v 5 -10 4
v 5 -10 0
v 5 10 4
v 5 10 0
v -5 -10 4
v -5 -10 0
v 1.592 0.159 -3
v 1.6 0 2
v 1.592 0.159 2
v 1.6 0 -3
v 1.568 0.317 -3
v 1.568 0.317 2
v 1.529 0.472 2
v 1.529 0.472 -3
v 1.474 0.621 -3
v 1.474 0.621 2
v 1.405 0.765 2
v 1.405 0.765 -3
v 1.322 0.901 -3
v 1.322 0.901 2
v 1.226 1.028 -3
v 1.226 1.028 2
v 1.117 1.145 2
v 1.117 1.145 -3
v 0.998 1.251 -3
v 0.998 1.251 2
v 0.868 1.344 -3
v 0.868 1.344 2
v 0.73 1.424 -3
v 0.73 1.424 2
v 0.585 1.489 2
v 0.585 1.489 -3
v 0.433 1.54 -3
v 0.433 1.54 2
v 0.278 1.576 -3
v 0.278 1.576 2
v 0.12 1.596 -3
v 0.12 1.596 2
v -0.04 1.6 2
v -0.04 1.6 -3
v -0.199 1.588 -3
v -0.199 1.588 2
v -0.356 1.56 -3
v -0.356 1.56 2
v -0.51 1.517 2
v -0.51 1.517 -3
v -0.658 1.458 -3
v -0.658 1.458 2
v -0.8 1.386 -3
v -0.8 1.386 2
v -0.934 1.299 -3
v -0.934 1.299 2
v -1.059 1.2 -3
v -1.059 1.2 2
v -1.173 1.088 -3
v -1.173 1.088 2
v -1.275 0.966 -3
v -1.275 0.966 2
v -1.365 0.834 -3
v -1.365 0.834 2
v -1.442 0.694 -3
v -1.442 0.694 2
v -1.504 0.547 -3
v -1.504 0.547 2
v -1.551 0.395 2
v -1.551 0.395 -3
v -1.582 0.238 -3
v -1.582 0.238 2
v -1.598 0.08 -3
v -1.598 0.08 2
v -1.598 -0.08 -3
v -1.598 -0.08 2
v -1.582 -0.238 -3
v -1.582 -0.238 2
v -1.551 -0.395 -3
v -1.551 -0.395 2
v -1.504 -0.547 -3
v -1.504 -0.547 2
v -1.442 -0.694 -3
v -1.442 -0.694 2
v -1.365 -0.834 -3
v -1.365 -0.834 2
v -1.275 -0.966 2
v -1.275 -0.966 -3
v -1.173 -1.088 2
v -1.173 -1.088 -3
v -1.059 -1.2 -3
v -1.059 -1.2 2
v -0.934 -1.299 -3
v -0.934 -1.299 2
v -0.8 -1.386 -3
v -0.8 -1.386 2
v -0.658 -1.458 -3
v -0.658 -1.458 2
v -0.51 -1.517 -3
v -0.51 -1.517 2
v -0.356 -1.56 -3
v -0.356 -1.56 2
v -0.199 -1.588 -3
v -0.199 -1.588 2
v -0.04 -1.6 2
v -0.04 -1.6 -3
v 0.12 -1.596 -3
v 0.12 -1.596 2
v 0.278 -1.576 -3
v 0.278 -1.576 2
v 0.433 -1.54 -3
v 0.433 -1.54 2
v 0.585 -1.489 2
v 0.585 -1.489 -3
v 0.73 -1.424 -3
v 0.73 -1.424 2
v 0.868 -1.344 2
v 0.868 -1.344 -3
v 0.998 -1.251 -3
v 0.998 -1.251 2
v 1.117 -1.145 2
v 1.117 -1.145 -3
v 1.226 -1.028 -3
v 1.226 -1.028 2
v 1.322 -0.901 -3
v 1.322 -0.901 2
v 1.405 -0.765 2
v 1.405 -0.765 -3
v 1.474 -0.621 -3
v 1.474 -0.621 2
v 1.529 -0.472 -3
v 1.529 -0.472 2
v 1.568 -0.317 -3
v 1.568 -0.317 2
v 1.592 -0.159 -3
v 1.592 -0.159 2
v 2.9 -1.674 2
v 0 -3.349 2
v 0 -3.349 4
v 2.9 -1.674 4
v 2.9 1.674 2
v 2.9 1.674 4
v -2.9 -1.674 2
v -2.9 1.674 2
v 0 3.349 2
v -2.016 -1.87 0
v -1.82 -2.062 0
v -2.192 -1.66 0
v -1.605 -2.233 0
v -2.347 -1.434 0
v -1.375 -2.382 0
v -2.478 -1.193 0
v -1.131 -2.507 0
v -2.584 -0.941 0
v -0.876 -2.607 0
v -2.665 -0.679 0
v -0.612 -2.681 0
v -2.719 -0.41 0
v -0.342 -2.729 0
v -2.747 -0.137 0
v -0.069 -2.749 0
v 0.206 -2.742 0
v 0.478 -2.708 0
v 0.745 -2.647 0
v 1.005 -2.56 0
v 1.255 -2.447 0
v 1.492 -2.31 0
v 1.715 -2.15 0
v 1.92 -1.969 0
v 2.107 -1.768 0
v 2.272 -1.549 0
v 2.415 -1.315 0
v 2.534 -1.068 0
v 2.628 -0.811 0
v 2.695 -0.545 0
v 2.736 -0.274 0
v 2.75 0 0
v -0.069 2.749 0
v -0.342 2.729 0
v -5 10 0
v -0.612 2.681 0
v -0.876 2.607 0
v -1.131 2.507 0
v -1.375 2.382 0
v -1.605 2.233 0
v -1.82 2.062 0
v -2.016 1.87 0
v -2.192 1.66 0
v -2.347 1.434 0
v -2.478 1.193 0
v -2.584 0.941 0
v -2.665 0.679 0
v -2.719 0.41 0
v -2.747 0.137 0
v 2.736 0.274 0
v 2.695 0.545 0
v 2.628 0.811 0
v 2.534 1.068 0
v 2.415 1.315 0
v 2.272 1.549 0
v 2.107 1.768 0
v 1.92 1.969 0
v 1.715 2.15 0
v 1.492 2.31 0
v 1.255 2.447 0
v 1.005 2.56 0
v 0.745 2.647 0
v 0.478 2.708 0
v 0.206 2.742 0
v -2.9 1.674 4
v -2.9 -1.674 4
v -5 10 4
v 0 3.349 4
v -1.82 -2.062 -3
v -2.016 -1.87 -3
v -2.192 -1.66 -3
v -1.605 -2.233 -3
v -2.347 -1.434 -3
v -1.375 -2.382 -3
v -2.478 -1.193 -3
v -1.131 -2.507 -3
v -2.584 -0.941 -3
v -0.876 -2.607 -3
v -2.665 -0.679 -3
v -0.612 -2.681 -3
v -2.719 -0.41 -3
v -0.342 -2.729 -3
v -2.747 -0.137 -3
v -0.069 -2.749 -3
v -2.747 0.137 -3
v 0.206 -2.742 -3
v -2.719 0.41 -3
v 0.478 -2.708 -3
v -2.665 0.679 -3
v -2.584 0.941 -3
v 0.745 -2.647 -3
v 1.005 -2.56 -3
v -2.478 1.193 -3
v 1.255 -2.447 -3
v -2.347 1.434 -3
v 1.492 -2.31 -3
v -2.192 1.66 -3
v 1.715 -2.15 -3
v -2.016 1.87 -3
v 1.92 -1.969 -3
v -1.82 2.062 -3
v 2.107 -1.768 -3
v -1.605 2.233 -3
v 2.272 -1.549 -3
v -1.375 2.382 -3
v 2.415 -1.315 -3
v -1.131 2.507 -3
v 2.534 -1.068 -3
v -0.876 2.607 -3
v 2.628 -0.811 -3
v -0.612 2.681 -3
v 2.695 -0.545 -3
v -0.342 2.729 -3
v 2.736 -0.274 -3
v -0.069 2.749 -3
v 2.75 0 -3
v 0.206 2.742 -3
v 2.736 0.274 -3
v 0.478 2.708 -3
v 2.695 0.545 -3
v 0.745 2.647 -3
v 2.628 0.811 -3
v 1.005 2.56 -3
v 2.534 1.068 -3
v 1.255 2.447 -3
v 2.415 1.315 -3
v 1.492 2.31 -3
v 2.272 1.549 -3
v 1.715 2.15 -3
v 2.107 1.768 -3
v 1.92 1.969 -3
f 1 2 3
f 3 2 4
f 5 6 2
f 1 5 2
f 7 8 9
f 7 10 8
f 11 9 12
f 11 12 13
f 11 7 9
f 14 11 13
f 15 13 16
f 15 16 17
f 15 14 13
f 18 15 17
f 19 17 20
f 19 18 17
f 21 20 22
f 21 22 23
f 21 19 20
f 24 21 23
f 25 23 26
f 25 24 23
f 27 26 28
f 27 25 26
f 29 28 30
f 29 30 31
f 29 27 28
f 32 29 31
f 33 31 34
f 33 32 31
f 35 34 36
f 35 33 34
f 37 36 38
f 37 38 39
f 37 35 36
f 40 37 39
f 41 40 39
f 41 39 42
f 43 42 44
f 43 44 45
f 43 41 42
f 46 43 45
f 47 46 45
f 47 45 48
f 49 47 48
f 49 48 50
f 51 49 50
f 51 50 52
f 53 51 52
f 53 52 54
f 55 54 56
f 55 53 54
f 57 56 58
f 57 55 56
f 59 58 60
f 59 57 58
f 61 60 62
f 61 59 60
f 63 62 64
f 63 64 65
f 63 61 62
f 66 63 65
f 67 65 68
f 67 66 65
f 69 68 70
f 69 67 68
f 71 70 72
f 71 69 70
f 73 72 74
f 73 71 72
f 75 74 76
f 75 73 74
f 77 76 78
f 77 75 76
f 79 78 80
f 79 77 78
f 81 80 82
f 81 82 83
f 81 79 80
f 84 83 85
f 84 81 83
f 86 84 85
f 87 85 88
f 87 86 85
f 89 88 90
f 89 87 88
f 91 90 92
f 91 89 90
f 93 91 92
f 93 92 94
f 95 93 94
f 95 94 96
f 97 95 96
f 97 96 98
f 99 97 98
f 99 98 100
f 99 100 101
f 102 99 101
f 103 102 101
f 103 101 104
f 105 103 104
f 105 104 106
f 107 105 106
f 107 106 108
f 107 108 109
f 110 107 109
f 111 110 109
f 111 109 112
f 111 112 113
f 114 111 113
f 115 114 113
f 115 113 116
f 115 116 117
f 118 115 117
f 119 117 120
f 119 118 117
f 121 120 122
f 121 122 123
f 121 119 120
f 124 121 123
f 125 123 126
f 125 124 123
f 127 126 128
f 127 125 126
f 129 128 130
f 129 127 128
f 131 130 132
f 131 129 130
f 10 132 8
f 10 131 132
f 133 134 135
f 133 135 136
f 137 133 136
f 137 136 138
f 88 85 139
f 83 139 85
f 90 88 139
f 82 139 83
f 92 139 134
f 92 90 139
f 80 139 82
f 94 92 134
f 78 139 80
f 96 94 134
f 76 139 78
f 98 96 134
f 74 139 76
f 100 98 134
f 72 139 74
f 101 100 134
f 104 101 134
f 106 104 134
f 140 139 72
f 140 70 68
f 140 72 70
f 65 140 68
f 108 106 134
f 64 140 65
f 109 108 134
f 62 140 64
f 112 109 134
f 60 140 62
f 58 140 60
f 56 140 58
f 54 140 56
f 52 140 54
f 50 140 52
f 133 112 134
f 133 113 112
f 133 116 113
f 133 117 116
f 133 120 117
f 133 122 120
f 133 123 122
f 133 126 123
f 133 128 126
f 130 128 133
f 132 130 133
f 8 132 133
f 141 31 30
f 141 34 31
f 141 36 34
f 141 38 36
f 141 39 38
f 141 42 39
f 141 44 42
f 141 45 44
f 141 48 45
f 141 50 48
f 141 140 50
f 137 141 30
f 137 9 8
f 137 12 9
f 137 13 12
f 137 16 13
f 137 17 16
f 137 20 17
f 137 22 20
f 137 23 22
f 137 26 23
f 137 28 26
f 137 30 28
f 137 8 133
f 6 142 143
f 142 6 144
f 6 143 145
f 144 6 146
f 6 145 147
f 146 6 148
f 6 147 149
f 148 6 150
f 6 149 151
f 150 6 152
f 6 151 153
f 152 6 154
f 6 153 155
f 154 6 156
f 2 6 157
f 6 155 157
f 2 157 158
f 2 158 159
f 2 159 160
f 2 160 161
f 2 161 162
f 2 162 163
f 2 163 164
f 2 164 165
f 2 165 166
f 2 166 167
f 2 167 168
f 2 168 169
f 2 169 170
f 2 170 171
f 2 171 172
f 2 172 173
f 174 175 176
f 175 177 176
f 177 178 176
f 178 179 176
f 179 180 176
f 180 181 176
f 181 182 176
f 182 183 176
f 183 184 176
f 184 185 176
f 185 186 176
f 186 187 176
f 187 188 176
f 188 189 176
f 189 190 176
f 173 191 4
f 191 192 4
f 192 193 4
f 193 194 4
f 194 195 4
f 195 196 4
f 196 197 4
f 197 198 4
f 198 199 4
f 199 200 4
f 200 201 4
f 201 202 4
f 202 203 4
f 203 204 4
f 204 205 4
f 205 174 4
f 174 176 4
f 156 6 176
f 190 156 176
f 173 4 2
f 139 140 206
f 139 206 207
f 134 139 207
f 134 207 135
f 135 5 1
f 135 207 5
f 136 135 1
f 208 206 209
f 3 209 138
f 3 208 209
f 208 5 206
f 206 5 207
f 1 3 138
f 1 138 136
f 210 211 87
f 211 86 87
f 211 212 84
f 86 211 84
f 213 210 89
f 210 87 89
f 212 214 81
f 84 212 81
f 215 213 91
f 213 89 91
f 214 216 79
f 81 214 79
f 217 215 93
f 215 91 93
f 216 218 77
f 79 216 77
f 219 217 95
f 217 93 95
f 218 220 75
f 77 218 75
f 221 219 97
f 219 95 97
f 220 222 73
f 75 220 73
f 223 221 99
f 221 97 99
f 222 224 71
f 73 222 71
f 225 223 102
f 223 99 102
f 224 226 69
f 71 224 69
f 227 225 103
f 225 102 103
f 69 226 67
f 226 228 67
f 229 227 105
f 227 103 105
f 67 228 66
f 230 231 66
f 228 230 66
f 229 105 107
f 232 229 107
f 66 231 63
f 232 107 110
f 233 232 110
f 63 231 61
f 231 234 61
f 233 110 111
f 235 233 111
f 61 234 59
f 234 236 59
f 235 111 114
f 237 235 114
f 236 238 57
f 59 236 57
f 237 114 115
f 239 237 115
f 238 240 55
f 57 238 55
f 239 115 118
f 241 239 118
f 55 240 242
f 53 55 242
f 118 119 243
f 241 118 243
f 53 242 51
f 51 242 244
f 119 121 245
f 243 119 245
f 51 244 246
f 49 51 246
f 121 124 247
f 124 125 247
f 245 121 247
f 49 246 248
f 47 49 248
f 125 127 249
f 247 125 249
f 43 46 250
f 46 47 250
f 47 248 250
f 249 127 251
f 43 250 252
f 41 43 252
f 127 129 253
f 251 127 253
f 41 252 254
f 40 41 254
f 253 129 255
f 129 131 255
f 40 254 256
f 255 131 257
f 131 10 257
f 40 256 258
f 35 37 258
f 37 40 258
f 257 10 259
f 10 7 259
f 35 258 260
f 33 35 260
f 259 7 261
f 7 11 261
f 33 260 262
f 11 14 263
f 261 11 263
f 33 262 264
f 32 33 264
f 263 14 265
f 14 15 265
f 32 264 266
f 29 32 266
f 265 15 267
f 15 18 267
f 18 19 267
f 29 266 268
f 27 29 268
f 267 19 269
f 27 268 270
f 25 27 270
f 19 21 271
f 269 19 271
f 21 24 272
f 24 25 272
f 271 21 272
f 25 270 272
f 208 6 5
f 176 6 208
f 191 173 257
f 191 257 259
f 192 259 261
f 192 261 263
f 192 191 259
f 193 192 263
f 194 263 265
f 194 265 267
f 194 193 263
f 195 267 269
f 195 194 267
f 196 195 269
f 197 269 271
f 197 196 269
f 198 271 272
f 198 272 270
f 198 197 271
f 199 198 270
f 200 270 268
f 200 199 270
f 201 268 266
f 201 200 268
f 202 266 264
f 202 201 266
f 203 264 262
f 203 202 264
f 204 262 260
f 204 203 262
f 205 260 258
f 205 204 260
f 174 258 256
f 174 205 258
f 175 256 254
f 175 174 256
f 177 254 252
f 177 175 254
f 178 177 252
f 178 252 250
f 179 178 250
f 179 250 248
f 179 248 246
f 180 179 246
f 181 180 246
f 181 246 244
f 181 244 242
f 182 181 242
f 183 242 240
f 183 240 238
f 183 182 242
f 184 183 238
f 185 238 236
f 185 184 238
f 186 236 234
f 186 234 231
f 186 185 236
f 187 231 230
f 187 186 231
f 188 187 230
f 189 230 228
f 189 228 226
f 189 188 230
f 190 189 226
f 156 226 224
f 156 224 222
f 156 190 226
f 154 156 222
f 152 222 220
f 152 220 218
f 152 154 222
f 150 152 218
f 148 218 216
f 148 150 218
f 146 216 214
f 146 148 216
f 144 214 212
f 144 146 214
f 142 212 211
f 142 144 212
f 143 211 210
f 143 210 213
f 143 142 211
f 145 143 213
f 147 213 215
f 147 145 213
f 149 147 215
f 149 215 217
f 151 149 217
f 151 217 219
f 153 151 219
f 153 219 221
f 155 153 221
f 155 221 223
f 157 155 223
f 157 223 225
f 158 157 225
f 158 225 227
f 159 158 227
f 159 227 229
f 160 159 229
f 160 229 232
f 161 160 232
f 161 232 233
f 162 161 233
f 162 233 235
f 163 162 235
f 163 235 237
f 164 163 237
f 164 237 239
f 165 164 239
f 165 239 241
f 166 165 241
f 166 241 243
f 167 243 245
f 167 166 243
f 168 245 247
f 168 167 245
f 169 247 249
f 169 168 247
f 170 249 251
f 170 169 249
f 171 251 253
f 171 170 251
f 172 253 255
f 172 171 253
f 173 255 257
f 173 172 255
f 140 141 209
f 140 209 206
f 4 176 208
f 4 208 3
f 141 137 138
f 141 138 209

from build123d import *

# Parameters (mm, degrees)
SKETCH006_R   = 2.75
SKETCH006_R_2 = 1.6
PAD005_DEPTH  = 3
SKETCH008_R   = 3.5
SKETCH008_R_2 = 1.6
PAD006_DEPTH  = 2
SKETCH007_W   = 10
SKETCH007_H   = 20
PAD007_DEPTH  = 4


with BuildPart() as part:
    # Sketch006 → Pad005 (new body)
    with BuildSketch(Plane.XY):
        Circle(SKETCH006_R)
        Circle(SKETCH006_R_2, mode=Mode.SUBTRACT)
    extrude(amount=-PAD005_DEPTH)

    # Sketch008 → Pad006 (join)
    with BuildSketch(Plane.XY):
        Circle(SKETCH008_R)
        Circle(SKETCH008_R_2, mode=Mode.SUBTRACT)
    extrude(amount=PAD006_DEPTH)

    # Sketch007 → Pad007 (join)
    with BuildSketch(Plane.XY):
        Rectangle(SKETCH007_W, SKETCH007_H)
        Polygon((0, -3.348632), (2.9, -1.674316), (2.9, 1.674316), (0, 3.348632), (-2.9, 1.674316), (-2.9, -1.674316), align=None, mode=Mode.SUBTRACT)
    extrude(amount=PAD007_DEPTH)


solid = part.part
